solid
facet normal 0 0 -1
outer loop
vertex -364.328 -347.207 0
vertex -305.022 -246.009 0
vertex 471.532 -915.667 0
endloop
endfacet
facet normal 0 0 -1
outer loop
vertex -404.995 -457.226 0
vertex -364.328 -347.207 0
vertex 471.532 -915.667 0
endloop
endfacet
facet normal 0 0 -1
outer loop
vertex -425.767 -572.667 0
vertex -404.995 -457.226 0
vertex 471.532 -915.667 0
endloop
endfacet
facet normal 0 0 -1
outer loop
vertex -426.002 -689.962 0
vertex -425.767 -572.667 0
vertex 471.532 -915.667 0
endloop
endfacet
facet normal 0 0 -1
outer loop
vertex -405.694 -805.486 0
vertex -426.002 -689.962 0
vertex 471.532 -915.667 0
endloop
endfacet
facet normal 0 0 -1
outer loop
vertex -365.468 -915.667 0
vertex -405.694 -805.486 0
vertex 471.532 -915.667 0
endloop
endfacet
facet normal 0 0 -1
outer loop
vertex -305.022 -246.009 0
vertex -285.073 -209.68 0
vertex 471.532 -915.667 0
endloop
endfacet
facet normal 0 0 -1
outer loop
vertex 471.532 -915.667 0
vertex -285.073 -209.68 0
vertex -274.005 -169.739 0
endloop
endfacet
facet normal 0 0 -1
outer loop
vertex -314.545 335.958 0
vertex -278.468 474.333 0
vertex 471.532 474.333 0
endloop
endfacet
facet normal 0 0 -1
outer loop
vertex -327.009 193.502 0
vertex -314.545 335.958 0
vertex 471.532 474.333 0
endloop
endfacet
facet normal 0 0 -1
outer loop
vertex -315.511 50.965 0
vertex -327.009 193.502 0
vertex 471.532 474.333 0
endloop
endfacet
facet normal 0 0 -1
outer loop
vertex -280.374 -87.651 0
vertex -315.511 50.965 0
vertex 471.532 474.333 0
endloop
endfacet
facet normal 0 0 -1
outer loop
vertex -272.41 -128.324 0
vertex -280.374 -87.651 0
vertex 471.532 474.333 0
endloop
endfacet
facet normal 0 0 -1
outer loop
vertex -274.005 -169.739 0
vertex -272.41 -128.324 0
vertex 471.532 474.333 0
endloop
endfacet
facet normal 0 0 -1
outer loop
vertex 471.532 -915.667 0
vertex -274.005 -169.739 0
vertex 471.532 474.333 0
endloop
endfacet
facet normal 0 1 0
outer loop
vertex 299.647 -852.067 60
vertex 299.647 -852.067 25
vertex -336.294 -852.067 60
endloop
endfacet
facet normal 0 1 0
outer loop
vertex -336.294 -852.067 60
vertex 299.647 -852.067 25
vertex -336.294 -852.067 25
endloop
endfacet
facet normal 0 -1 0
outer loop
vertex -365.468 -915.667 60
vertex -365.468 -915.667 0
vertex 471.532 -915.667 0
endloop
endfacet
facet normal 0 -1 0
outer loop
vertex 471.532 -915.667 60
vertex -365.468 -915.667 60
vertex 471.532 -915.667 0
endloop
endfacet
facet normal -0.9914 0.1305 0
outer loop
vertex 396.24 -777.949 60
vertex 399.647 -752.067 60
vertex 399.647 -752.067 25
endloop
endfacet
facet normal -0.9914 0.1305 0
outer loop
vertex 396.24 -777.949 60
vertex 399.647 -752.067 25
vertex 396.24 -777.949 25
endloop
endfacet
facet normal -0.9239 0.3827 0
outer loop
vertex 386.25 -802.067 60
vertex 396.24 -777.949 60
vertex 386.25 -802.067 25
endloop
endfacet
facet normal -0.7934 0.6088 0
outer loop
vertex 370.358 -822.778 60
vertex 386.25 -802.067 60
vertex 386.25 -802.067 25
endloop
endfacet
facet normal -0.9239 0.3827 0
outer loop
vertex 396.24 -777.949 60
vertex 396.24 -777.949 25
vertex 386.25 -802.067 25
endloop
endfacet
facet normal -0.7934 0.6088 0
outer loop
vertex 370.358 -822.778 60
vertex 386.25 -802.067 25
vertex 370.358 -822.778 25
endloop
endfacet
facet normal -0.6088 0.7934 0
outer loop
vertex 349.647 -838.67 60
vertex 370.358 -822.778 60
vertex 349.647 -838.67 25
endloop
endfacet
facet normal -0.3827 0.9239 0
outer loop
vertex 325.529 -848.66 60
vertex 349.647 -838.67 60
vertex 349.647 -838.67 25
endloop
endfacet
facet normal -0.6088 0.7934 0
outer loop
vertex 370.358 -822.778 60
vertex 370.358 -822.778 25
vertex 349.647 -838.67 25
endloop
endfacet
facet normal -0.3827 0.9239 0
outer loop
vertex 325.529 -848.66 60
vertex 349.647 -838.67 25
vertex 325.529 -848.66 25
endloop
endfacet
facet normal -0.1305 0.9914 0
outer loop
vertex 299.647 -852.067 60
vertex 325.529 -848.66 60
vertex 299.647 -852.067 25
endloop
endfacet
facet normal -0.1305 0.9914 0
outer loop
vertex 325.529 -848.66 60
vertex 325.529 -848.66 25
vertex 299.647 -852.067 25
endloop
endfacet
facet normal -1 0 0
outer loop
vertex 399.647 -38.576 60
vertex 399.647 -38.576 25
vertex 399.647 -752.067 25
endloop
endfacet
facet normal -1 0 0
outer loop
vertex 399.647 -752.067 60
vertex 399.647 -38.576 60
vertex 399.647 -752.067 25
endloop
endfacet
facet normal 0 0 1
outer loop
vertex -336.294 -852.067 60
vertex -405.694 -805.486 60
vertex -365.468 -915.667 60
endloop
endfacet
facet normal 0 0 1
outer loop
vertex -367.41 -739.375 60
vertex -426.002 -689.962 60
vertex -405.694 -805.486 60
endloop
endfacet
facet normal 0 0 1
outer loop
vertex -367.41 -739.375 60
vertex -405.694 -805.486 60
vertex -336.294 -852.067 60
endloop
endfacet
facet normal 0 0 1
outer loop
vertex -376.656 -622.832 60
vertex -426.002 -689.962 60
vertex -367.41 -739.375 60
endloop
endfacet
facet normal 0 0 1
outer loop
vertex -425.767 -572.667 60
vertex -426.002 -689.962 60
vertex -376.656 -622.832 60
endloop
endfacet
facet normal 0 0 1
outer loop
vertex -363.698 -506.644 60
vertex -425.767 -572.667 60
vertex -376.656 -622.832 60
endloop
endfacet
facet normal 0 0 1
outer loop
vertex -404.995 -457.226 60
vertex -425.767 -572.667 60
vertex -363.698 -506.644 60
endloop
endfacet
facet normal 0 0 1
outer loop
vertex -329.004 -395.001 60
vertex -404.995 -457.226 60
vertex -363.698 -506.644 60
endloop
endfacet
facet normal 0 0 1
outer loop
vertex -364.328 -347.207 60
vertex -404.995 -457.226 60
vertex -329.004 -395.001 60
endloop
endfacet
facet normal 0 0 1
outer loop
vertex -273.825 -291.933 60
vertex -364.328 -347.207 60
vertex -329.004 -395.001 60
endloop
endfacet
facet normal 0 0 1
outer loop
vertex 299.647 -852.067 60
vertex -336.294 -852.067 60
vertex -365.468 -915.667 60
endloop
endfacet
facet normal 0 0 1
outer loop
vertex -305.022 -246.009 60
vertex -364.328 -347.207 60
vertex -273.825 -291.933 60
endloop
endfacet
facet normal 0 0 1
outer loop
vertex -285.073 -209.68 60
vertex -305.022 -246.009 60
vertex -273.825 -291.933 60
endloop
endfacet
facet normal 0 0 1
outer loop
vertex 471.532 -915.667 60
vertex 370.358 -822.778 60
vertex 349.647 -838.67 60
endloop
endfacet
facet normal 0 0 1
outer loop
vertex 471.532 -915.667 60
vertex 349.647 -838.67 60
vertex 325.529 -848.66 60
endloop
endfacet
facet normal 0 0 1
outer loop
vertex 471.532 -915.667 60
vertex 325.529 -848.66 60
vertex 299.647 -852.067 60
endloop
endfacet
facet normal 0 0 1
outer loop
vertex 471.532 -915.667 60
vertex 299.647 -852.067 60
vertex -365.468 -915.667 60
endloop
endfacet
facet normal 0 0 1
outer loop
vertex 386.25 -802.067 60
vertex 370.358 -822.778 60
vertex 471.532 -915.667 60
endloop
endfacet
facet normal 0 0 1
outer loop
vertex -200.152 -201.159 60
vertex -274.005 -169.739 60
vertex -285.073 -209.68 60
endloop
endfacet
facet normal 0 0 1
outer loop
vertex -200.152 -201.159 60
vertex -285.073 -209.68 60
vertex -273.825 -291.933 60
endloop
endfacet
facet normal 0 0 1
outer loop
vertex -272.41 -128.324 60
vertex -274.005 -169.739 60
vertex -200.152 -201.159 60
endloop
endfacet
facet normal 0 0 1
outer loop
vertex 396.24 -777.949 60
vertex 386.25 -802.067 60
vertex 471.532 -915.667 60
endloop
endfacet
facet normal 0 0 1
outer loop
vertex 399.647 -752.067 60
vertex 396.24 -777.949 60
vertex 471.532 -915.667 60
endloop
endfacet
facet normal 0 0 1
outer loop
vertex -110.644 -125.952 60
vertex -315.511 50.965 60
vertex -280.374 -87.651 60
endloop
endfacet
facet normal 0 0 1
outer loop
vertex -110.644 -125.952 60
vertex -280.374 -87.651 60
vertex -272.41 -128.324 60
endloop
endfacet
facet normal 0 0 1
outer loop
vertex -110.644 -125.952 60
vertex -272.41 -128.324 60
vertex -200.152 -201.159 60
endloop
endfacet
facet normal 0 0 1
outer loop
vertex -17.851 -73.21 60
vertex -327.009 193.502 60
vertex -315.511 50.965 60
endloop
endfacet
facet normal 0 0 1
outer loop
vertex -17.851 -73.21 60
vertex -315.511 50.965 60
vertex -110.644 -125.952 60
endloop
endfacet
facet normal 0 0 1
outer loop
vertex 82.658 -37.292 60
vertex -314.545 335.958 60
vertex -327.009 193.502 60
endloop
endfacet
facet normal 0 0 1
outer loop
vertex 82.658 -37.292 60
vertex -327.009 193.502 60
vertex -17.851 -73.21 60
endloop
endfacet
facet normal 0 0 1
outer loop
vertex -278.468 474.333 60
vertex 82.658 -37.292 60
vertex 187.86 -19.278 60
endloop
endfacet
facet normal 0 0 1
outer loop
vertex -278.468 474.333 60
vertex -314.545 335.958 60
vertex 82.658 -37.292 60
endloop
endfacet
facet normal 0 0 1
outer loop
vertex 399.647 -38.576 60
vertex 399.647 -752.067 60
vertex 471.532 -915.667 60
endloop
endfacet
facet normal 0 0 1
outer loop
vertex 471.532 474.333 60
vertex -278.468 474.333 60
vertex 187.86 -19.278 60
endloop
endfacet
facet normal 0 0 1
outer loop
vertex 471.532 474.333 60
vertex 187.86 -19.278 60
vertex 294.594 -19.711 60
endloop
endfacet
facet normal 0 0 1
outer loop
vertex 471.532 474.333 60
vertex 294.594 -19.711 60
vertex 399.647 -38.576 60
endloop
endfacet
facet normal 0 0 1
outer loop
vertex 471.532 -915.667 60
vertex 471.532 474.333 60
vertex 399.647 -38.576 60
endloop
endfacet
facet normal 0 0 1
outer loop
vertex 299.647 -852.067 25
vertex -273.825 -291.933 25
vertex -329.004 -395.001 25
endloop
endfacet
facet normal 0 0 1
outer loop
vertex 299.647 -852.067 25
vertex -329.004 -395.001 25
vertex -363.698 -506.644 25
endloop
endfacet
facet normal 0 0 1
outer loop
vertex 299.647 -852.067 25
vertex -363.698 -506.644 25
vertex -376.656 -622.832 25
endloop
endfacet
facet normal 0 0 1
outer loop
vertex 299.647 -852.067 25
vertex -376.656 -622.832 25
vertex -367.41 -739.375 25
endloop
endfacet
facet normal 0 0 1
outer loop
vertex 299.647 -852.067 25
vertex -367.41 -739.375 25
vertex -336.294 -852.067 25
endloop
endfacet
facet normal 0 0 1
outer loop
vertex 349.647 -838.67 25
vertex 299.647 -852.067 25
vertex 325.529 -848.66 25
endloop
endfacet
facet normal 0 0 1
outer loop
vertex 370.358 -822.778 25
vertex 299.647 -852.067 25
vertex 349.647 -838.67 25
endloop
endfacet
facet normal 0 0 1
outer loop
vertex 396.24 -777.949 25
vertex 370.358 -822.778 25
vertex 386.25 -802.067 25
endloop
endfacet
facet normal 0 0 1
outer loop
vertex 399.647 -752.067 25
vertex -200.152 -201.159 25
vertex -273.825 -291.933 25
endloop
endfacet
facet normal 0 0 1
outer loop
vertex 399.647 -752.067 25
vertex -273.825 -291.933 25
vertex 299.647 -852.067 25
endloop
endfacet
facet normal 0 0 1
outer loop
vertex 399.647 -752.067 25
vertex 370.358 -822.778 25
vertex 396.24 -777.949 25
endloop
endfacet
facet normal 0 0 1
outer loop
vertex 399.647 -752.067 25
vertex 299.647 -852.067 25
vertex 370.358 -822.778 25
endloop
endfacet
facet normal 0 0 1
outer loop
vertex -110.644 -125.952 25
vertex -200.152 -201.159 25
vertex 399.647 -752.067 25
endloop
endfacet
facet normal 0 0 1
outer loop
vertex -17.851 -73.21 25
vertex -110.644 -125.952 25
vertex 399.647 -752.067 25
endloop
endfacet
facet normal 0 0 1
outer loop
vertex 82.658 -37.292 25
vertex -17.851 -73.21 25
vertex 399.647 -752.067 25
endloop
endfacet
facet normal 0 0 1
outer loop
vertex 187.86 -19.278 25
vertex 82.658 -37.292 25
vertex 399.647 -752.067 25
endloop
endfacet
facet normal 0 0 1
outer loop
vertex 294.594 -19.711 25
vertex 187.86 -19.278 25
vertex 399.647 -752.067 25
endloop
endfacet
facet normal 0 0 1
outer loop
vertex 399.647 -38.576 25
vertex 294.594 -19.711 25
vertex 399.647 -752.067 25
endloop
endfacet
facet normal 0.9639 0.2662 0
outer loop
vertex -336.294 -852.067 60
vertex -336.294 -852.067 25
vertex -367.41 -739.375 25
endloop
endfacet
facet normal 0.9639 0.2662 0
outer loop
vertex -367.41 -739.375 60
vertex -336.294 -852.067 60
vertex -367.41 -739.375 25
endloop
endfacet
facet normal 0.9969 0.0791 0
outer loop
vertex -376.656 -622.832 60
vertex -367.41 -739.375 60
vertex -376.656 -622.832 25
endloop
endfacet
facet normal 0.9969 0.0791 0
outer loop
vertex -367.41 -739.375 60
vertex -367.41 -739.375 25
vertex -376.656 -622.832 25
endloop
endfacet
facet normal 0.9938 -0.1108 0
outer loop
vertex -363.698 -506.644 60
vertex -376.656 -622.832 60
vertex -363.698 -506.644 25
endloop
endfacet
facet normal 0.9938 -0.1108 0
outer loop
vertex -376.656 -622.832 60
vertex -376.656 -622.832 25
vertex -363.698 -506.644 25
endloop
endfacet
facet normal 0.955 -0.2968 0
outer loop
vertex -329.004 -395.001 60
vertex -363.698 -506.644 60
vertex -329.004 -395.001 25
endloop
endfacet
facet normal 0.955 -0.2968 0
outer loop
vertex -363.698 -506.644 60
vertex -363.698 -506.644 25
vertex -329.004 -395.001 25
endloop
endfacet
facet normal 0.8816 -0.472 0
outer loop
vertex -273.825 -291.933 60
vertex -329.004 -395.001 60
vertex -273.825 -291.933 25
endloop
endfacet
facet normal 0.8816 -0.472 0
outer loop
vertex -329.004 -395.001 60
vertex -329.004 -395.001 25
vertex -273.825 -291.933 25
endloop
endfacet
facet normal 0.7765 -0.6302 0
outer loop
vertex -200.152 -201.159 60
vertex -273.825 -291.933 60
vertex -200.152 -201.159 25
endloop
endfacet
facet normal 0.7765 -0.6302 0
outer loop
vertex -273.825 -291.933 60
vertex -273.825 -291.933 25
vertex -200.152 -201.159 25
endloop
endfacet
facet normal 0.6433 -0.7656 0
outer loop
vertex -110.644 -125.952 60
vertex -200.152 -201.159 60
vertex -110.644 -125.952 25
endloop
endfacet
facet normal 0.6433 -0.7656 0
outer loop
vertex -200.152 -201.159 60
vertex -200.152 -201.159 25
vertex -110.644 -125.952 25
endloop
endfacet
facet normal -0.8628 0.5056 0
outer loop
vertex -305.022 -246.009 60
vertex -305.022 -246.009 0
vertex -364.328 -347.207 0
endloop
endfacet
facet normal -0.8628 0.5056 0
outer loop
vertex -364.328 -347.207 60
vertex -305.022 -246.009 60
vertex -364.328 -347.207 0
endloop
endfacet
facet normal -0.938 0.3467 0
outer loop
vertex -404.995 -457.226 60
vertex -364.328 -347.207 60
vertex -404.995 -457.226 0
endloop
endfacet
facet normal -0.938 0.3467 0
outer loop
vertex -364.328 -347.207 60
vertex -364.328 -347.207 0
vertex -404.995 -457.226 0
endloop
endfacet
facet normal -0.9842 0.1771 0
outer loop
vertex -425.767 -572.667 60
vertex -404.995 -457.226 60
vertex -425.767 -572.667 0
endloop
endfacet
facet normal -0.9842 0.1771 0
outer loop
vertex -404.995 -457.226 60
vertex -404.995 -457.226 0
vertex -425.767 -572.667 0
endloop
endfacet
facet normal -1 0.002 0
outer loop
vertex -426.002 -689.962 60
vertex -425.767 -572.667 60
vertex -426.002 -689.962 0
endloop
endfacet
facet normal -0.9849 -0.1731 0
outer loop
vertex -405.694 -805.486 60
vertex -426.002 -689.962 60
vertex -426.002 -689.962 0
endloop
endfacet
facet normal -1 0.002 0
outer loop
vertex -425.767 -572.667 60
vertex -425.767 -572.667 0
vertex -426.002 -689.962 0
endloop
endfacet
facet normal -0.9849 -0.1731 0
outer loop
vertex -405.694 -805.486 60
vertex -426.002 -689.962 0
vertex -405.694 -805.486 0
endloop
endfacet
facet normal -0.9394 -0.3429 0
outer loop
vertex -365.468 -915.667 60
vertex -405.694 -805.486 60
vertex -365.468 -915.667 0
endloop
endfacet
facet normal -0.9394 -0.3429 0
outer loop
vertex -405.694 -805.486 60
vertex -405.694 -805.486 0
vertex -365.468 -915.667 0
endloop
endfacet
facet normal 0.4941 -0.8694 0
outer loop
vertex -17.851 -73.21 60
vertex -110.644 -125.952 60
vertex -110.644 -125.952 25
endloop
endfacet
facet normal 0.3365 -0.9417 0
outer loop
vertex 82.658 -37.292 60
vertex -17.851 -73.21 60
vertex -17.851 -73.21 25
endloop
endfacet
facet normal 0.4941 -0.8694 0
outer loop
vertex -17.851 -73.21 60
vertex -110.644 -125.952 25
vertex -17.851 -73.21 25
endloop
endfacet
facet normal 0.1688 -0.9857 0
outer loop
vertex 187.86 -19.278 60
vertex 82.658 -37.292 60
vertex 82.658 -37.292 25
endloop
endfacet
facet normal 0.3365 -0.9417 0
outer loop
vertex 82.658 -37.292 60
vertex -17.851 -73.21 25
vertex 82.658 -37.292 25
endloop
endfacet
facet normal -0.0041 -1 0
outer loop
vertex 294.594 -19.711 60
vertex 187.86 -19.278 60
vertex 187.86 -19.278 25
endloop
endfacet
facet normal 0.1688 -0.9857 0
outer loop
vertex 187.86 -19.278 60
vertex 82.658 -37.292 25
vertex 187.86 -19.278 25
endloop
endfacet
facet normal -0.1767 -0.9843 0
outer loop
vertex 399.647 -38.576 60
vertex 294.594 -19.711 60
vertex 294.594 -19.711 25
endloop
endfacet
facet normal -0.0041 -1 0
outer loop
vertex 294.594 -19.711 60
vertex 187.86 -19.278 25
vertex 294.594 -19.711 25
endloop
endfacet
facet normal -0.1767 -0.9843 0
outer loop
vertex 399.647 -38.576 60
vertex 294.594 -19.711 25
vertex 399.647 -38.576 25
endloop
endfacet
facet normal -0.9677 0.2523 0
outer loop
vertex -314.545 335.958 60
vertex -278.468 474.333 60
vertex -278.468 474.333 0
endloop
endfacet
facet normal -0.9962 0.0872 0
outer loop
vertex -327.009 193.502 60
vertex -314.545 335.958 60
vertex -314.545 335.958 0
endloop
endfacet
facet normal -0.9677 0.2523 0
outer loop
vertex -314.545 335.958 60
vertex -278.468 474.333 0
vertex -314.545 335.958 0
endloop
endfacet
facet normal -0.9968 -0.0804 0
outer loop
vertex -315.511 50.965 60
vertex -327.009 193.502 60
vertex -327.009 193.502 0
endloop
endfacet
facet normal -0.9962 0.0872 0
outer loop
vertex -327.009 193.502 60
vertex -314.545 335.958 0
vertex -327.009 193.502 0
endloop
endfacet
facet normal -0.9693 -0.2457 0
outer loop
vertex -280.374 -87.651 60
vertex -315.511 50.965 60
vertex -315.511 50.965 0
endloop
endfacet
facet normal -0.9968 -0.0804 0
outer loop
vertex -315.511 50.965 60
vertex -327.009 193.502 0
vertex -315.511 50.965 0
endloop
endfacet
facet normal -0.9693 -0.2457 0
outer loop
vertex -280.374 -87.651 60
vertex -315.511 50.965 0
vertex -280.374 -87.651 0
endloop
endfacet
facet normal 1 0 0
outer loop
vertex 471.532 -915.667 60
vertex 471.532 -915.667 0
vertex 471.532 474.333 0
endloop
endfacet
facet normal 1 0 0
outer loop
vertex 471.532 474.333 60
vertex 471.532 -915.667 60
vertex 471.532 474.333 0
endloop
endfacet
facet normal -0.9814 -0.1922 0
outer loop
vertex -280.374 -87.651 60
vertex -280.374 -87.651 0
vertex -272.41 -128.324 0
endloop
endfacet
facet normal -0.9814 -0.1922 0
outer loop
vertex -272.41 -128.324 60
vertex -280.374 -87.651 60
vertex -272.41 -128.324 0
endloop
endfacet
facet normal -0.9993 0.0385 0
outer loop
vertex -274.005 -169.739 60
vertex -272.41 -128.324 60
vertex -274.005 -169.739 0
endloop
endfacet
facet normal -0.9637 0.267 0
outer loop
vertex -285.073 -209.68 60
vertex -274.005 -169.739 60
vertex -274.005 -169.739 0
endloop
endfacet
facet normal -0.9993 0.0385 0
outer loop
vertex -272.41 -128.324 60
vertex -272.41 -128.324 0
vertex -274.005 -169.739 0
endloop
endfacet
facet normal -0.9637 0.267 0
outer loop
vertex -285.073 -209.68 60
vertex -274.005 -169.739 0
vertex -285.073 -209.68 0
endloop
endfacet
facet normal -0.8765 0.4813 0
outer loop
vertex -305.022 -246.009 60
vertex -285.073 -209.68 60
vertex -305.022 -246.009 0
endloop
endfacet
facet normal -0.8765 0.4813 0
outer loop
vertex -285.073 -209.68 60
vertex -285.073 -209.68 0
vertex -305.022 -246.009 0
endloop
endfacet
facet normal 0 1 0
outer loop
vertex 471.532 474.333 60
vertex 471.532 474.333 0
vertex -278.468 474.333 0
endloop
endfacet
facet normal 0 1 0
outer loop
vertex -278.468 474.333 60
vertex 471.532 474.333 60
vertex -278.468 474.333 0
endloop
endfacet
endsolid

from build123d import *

# Parameters (mm, degrees)
F1_DEPTH = 60
F2_DEPTH = 25


# Not quite as in the source:
# - the program builds the solid bodies; features that only make, move or delete a surface that nothing else refers to are left out


with BuildPart() as f1:
    # F0 (on Top) → F1 (new body)
    with BuildSketch(Plane.XY):
        with BuildLine():
            ThreePointArc((-305.0224336339, -246.0090226419), (-425.7668614501, -572.66743243), (-365.4684518499, -915.6674839367))
            Line((-365.4684518499, -915.6674839367), (-337.7260933976, -915.6674839367))
            ThreePointArc((-337.7260933976, -915.6674839367), (-383.1853890072, -472.5820879471), (-129.4684518499, -106.4961260526))
            ThreePointArc((-129.4684518499, -106.4961260526), (-213.2726615111, 23.7464933662), (-249.4684518499, 174.3325160633))
            Line((-249.4684518499, 174.3325160633), (-249.4684518499, 474.3325160633))
            Line((-249.4684518499, 474.3325160633), (-278.4684518499, 474.3325160633))
            ThreePointArc((-278.4684518499, 474.3325160633), (-327.0089672753, 193.5023169021), (-280.3739250896, -87.6505867625))
            ThreePointArc((-280.3739250896, -87.6505867625), (-274.0048617812, -169.7394217084), (-305.0224336339, -246.0090226419))
        make_face()
        with BuildLine():
            ThreePointArc((-129.4684518499, -106.4961260526), (-383.1853890072, -472.5820879471), (-337.7260933976, -915.6674839367))
            Line((-337.7260933976, -915.6674839367), (-307.8033710716, -915.6674839367))
            ThreePointArc((-307.8033710716, -915.6674839367), (-322.9497717837, -884.2710326331), (-336.294380675, -852.0674300004))
            ThreePointArc((-336.294380675, -852.0674300004), (-349.0076832074, -449.9968879223), (-110.6437650385, -125.9521512216))
            ThreePointArc((-110.6437650385, -125.9521512216), (-120.198249318, -116.3616671102), (-129.4684518499, -106.4961260526))
        make_face()
        with BuildLine():
            ThreePointArc((-336.294380675, -852.0674300004), (-322.9497717837, -884.2710326331), (-307.8033710716, -915.6674839367))
            Line((-307.8033710716, -915.6674839367), (471.5315481501, -915.6674839367))
            Line((471.5315481501, -915.6674839367), (471.5315481501, -255.6674839367))
            Line((471.5315481501, -255.6674839367), (399.6472072601, -255.6674839367))
            Line((399.6472072601, -255.6674839367), (399.6472072601, -752.0674300004))
            ThreePointArc((399.6472072601, -752.0674300004), (370.3578853788, -822.778108119), (299.6472072601, -852.0674300004))
            Line((299.6472072601, -852.0674300004), (-336.294380675, -852.0674300004))
        make_face()
        with BuildLine():
            ThreePointArc((-249.4684518499, 174.3325160633), (-213.2726615111, 23.7464933662), (-129.4684518499, -106.4961260526))
            ThreePointArc((-129.4684518499, -106.4961260526), (-120.198249318, -116.3616671102), (-110.6437650385, -125.9521512216))
            ThreePointArc((-110.6437650385, -125.9521512216), (134.8677667197, -26.0001986196), (399.6472072601, -38.5760851606))
            Line((399.6472072601, -38.5760851606), (399.6472072601, -255.6674839367))
            Line((399.6472072601, -255.6674839367), (471.5315481501, -255.6674839367))
            Line((471.5315481501, -255.6674839367), (471.5315481501, 474.3325160633))
            Line((471.5315481501, 474.3325160633), (-249.4684518499, 474.3325160633))
            Line((-249.4684518499, 474.3325160633), (-249.4684518499, 174.3325160633))
        make_face()
    extrude(amount=F1_DEPTH)

    # F0 (on Top) → F2 (join)
    with BuildSketch(Plane.XY):
        with BuildLine():
            ThreePointArc((-110.6437650385, -125.9521512216), (-349.0076832074, -449.9968879223), (-336.294380675, -852.0674300004))
            Line((-336.294380675, -852.0674300004), (299.6472072601, -852.0674300004))
            ThreePointArc((299.6472072601, -852.0674300004), (370.3578853788, -822.778108119), (399.6472072601, -752.0674300004))
            Line((399.6472072601, -752.0674300004), (399.6472072601, -255.6674839367))
            Line((399.6472072601, -255.6674839367), (171.5315481501, -255.6674839367))
            ThreePointArc((171.5315481501, -255.6674839367), (19.2512340542, -215.1576843257), (-110.6437650385, -125.9521512216))
        make_face()
        with BuildLine():
            ThreePointArc((399.6472072601, -38.5760851606), (134.8677667197, -26.0001986196), (-110.6437650385, -125.9521512216))
            ThreePointArc((-110.6437650385, -125.9521512216), (19.2512340542, -215.1576843257), (171.5315481501, -255.6674839367))
            Line((171.5315481501, -255.6674839367), (399.6472072601, -255.6674839367))
            Line((399.6472072601, -255.6674839367), (399.6472072601, -38.5760851606))
        make_face()
    extrude(amount=F2_DEPTH)


solid = f1.part
